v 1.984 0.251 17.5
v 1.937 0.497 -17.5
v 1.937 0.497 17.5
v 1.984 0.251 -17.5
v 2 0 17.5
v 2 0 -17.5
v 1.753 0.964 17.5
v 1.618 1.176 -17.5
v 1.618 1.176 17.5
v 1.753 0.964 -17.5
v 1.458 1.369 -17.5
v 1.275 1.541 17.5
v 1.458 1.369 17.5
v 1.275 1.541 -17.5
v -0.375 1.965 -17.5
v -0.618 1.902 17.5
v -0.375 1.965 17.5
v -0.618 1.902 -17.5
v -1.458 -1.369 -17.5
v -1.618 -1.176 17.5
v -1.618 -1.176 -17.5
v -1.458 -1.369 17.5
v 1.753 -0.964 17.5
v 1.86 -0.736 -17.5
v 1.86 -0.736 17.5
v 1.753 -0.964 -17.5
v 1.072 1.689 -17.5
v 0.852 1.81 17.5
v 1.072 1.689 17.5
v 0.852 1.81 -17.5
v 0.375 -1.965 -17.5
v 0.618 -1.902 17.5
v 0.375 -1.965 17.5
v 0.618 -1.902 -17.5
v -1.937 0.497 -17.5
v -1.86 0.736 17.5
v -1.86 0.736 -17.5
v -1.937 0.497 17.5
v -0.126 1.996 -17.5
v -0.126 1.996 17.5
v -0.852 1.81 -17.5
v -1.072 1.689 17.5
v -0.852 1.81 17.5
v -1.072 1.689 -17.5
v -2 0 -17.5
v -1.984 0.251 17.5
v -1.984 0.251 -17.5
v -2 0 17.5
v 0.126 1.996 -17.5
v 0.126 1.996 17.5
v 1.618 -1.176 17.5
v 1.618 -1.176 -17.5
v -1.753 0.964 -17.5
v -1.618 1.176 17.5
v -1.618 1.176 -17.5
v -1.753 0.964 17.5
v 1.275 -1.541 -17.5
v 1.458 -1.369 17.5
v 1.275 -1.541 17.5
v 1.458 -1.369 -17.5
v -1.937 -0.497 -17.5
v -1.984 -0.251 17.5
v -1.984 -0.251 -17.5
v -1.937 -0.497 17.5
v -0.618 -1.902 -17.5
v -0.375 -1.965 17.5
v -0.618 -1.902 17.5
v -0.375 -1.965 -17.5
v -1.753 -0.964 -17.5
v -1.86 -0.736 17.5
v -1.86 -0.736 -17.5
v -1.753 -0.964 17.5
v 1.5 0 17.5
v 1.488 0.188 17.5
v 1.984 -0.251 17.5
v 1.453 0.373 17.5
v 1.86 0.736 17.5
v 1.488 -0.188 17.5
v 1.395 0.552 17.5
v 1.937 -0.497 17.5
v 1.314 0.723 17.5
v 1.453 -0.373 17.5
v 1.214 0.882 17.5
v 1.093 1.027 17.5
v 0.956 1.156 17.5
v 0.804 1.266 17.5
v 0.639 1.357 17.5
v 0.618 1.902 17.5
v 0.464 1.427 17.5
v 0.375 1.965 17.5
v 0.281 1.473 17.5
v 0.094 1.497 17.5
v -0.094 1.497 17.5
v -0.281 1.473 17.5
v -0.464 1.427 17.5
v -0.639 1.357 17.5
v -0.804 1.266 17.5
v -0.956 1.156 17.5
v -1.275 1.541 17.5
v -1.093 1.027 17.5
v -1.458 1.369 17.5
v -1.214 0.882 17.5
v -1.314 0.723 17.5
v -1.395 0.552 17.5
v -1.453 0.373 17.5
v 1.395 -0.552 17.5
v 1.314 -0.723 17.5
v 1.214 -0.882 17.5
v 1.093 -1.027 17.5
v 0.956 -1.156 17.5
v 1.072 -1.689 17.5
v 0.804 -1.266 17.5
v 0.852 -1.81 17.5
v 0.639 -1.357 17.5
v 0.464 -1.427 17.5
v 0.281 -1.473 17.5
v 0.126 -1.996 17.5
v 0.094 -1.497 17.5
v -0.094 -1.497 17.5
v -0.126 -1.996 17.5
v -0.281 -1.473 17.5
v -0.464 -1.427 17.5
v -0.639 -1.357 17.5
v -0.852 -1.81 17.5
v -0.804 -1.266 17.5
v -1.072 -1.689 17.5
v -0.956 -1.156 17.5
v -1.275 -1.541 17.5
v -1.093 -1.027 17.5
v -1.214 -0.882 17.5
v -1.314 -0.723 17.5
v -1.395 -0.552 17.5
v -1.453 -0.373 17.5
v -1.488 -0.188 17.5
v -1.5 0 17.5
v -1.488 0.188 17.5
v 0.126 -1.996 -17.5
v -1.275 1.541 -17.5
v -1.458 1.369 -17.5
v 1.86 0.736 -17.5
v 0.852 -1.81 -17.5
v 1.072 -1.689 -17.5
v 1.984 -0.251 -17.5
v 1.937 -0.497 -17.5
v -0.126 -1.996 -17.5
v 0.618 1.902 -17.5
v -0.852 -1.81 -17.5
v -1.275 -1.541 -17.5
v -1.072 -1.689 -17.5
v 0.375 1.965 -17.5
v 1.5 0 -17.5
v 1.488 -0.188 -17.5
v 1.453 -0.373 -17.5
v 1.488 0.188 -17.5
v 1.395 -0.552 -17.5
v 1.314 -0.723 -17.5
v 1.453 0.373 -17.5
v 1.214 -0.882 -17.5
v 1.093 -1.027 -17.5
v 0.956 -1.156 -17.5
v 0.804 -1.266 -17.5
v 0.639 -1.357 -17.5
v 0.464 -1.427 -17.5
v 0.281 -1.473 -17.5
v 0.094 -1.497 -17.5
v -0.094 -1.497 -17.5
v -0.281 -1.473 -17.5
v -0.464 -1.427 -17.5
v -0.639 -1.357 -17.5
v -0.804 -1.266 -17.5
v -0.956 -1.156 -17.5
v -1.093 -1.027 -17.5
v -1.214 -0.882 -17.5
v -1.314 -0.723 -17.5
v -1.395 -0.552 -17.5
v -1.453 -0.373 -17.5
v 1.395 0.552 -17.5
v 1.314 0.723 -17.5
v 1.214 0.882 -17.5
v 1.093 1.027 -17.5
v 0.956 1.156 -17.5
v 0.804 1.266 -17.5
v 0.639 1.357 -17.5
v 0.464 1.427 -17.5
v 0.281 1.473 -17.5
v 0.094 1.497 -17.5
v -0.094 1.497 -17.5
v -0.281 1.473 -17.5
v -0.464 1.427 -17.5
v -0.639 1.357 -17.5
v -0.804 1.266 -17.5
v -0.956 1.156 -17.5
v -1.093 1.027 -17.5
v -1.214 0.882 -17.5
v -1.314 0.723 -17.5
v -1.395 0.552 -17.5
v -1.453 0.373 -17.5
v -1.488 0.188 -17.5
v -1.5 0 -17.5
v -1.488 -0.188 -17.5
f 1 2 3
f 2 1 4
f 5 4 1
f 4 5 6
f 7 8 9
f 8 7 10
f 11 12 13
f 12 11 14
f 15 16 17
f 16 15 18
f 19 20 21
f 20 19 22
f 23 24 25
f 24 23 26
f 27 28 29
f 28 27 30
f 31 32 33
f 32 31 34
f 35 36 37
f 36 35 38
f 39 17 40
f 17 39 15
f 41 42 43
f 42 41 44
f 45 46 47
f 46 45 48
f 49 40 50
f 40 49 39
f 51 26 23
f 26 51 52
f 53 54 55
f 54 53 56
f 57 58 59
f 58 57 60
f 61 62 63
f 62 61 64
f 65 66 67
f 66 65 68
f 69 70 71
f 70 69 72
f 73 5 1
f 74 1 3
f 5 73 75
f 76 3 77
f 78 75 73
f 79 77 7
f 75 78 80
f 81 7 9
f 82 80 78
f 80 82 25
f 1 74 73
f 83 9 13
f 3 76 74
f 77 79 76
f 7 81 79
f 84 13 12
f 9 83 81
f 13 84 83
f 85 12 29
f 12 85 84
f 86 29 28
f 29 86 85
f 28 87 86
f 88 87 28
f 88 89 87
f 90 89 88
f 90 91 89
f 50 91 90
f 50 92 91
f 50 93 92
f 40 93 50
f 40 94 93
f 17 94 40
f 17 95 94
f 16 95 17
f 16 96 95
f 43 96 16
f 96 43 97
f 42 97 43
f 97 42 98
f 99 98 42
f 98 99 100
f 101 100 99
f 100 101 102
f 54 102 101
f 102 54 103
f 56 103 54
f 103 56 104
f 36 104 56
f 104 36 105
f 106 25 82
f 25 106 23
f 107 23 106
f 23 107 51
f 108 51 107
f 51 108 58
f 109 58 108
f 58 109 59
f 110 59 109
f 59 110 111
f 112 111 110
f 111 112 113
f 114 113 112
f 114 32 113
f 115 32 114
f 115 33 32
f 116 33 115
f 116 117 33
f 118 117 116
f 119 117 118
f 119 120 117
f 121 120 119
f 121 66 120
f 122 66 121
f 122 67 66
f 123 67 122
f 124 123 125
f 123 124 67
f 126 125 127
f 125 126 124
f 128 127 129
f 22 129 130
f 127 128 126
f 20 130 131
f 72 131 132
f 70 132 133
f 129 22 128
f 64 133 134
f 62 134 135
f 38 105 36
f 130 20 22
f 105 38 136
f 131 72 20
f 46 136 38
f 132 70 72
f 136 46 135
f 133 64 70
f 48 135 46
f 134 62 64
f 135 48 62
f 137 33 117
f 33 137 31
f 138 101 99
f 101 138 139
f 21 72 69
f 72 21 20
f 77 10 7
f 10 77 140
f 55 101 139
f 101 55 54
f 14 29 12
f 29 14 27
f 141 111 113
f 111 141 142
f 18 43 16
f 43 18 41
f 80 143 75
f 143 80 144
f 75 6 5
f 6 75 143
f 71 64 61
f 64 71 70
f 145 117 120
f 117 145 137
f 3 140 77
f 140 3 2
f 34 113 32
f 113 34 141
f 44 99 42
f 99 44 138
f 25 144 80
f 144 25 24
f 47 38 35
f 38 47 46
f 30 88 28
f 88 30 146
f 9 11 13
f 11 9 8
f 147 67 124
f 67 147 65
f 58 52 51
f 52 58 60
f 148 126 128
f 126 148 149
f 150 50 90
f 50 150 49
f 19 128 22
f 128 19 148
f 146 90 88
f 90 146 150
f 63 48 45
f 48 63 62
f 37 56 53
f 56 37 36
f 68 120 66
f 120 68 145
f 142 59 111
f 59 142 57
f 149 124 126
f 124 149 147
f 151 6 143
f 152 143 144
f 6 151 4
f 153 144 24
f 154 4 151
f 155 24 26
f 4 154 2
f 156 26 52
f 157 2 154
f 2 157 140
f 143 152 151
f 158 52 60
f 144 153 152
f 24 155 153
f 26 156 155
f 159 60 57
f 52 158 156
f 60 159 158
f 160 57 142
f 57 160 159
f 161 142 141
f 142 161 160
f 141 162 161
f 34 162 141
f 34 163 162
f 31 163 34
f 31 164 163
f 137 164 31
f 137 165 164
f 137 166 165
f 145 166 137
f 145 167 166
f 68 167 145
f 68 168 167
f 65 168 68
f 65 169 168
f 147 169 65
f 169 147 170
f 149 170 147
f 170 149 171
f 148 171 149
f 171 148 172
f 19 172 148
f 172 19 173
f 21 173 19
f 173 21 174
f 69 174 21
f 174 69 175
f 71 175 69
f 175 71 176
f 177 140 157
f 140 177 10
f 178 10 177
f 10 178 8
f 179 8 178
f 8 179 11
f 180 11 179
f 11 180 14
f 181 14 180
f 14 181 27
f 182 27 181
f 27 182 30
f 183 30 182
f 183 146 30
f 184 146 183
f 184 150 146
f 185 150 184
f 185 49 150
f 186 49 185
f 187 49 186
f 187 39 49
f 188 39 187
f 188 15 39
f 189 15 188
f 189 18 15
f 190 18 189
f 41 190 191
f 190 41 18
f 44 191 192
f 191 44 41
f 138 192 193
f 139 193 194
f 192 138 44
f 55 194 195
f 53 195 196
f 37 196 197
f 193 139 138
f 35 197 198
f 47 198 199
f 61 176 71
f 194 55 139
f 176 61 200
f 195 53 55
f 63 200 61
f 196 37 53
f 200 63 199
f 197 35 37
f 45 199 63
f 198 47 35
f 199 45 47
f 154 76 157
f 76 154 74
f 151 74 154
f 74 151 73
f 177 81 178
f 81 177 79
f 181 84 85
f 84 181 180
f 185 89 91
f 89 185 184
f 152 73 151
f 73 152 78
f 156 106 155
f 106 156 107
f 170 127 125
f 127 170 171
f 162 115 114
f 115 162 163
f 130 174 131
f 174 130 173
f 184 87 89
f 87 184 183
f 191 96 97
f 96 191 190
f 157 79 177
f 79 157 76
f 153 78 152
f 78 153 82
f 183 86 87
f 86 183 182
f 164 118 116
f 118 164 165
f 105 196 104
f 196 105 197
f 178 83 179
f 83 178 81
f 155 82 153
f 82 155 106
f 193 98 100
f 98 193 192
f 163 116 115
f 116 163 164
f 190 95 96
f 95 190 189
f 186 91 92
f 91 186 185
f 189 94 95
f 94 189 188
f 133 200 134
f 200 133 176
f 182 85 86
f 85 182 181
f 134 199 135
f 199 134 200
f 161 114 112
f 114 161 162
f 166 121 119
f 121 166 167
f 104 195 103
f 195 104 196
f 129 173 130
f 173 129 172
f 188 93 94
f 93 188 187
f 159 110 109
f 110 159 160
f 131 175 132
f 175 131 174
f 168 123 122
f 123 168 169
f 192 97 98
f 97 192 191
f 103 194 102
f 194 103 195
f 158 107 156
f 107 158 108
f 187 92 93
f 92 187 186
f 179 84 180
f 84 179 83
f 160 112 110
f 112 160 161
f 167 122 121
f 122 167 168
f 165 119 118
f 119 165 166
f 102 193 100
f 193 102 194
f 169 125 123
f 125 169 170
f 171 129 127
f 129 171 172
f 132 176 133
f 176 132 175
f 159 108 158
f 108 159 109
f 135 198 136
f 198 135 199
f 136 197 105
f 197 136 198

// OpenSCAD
$fn = 50;


difference() {
	union() {
		translate(v = [0, 0, -17.5000000000]) {
			cylinder(h = 35, r = 2.0000000000);
		}
	}
	union() {
		translate(v = [0, 0, -100.0000000000]) {
			cylinder(h = 200, r = 1.5000000000);
		}
	}
}
